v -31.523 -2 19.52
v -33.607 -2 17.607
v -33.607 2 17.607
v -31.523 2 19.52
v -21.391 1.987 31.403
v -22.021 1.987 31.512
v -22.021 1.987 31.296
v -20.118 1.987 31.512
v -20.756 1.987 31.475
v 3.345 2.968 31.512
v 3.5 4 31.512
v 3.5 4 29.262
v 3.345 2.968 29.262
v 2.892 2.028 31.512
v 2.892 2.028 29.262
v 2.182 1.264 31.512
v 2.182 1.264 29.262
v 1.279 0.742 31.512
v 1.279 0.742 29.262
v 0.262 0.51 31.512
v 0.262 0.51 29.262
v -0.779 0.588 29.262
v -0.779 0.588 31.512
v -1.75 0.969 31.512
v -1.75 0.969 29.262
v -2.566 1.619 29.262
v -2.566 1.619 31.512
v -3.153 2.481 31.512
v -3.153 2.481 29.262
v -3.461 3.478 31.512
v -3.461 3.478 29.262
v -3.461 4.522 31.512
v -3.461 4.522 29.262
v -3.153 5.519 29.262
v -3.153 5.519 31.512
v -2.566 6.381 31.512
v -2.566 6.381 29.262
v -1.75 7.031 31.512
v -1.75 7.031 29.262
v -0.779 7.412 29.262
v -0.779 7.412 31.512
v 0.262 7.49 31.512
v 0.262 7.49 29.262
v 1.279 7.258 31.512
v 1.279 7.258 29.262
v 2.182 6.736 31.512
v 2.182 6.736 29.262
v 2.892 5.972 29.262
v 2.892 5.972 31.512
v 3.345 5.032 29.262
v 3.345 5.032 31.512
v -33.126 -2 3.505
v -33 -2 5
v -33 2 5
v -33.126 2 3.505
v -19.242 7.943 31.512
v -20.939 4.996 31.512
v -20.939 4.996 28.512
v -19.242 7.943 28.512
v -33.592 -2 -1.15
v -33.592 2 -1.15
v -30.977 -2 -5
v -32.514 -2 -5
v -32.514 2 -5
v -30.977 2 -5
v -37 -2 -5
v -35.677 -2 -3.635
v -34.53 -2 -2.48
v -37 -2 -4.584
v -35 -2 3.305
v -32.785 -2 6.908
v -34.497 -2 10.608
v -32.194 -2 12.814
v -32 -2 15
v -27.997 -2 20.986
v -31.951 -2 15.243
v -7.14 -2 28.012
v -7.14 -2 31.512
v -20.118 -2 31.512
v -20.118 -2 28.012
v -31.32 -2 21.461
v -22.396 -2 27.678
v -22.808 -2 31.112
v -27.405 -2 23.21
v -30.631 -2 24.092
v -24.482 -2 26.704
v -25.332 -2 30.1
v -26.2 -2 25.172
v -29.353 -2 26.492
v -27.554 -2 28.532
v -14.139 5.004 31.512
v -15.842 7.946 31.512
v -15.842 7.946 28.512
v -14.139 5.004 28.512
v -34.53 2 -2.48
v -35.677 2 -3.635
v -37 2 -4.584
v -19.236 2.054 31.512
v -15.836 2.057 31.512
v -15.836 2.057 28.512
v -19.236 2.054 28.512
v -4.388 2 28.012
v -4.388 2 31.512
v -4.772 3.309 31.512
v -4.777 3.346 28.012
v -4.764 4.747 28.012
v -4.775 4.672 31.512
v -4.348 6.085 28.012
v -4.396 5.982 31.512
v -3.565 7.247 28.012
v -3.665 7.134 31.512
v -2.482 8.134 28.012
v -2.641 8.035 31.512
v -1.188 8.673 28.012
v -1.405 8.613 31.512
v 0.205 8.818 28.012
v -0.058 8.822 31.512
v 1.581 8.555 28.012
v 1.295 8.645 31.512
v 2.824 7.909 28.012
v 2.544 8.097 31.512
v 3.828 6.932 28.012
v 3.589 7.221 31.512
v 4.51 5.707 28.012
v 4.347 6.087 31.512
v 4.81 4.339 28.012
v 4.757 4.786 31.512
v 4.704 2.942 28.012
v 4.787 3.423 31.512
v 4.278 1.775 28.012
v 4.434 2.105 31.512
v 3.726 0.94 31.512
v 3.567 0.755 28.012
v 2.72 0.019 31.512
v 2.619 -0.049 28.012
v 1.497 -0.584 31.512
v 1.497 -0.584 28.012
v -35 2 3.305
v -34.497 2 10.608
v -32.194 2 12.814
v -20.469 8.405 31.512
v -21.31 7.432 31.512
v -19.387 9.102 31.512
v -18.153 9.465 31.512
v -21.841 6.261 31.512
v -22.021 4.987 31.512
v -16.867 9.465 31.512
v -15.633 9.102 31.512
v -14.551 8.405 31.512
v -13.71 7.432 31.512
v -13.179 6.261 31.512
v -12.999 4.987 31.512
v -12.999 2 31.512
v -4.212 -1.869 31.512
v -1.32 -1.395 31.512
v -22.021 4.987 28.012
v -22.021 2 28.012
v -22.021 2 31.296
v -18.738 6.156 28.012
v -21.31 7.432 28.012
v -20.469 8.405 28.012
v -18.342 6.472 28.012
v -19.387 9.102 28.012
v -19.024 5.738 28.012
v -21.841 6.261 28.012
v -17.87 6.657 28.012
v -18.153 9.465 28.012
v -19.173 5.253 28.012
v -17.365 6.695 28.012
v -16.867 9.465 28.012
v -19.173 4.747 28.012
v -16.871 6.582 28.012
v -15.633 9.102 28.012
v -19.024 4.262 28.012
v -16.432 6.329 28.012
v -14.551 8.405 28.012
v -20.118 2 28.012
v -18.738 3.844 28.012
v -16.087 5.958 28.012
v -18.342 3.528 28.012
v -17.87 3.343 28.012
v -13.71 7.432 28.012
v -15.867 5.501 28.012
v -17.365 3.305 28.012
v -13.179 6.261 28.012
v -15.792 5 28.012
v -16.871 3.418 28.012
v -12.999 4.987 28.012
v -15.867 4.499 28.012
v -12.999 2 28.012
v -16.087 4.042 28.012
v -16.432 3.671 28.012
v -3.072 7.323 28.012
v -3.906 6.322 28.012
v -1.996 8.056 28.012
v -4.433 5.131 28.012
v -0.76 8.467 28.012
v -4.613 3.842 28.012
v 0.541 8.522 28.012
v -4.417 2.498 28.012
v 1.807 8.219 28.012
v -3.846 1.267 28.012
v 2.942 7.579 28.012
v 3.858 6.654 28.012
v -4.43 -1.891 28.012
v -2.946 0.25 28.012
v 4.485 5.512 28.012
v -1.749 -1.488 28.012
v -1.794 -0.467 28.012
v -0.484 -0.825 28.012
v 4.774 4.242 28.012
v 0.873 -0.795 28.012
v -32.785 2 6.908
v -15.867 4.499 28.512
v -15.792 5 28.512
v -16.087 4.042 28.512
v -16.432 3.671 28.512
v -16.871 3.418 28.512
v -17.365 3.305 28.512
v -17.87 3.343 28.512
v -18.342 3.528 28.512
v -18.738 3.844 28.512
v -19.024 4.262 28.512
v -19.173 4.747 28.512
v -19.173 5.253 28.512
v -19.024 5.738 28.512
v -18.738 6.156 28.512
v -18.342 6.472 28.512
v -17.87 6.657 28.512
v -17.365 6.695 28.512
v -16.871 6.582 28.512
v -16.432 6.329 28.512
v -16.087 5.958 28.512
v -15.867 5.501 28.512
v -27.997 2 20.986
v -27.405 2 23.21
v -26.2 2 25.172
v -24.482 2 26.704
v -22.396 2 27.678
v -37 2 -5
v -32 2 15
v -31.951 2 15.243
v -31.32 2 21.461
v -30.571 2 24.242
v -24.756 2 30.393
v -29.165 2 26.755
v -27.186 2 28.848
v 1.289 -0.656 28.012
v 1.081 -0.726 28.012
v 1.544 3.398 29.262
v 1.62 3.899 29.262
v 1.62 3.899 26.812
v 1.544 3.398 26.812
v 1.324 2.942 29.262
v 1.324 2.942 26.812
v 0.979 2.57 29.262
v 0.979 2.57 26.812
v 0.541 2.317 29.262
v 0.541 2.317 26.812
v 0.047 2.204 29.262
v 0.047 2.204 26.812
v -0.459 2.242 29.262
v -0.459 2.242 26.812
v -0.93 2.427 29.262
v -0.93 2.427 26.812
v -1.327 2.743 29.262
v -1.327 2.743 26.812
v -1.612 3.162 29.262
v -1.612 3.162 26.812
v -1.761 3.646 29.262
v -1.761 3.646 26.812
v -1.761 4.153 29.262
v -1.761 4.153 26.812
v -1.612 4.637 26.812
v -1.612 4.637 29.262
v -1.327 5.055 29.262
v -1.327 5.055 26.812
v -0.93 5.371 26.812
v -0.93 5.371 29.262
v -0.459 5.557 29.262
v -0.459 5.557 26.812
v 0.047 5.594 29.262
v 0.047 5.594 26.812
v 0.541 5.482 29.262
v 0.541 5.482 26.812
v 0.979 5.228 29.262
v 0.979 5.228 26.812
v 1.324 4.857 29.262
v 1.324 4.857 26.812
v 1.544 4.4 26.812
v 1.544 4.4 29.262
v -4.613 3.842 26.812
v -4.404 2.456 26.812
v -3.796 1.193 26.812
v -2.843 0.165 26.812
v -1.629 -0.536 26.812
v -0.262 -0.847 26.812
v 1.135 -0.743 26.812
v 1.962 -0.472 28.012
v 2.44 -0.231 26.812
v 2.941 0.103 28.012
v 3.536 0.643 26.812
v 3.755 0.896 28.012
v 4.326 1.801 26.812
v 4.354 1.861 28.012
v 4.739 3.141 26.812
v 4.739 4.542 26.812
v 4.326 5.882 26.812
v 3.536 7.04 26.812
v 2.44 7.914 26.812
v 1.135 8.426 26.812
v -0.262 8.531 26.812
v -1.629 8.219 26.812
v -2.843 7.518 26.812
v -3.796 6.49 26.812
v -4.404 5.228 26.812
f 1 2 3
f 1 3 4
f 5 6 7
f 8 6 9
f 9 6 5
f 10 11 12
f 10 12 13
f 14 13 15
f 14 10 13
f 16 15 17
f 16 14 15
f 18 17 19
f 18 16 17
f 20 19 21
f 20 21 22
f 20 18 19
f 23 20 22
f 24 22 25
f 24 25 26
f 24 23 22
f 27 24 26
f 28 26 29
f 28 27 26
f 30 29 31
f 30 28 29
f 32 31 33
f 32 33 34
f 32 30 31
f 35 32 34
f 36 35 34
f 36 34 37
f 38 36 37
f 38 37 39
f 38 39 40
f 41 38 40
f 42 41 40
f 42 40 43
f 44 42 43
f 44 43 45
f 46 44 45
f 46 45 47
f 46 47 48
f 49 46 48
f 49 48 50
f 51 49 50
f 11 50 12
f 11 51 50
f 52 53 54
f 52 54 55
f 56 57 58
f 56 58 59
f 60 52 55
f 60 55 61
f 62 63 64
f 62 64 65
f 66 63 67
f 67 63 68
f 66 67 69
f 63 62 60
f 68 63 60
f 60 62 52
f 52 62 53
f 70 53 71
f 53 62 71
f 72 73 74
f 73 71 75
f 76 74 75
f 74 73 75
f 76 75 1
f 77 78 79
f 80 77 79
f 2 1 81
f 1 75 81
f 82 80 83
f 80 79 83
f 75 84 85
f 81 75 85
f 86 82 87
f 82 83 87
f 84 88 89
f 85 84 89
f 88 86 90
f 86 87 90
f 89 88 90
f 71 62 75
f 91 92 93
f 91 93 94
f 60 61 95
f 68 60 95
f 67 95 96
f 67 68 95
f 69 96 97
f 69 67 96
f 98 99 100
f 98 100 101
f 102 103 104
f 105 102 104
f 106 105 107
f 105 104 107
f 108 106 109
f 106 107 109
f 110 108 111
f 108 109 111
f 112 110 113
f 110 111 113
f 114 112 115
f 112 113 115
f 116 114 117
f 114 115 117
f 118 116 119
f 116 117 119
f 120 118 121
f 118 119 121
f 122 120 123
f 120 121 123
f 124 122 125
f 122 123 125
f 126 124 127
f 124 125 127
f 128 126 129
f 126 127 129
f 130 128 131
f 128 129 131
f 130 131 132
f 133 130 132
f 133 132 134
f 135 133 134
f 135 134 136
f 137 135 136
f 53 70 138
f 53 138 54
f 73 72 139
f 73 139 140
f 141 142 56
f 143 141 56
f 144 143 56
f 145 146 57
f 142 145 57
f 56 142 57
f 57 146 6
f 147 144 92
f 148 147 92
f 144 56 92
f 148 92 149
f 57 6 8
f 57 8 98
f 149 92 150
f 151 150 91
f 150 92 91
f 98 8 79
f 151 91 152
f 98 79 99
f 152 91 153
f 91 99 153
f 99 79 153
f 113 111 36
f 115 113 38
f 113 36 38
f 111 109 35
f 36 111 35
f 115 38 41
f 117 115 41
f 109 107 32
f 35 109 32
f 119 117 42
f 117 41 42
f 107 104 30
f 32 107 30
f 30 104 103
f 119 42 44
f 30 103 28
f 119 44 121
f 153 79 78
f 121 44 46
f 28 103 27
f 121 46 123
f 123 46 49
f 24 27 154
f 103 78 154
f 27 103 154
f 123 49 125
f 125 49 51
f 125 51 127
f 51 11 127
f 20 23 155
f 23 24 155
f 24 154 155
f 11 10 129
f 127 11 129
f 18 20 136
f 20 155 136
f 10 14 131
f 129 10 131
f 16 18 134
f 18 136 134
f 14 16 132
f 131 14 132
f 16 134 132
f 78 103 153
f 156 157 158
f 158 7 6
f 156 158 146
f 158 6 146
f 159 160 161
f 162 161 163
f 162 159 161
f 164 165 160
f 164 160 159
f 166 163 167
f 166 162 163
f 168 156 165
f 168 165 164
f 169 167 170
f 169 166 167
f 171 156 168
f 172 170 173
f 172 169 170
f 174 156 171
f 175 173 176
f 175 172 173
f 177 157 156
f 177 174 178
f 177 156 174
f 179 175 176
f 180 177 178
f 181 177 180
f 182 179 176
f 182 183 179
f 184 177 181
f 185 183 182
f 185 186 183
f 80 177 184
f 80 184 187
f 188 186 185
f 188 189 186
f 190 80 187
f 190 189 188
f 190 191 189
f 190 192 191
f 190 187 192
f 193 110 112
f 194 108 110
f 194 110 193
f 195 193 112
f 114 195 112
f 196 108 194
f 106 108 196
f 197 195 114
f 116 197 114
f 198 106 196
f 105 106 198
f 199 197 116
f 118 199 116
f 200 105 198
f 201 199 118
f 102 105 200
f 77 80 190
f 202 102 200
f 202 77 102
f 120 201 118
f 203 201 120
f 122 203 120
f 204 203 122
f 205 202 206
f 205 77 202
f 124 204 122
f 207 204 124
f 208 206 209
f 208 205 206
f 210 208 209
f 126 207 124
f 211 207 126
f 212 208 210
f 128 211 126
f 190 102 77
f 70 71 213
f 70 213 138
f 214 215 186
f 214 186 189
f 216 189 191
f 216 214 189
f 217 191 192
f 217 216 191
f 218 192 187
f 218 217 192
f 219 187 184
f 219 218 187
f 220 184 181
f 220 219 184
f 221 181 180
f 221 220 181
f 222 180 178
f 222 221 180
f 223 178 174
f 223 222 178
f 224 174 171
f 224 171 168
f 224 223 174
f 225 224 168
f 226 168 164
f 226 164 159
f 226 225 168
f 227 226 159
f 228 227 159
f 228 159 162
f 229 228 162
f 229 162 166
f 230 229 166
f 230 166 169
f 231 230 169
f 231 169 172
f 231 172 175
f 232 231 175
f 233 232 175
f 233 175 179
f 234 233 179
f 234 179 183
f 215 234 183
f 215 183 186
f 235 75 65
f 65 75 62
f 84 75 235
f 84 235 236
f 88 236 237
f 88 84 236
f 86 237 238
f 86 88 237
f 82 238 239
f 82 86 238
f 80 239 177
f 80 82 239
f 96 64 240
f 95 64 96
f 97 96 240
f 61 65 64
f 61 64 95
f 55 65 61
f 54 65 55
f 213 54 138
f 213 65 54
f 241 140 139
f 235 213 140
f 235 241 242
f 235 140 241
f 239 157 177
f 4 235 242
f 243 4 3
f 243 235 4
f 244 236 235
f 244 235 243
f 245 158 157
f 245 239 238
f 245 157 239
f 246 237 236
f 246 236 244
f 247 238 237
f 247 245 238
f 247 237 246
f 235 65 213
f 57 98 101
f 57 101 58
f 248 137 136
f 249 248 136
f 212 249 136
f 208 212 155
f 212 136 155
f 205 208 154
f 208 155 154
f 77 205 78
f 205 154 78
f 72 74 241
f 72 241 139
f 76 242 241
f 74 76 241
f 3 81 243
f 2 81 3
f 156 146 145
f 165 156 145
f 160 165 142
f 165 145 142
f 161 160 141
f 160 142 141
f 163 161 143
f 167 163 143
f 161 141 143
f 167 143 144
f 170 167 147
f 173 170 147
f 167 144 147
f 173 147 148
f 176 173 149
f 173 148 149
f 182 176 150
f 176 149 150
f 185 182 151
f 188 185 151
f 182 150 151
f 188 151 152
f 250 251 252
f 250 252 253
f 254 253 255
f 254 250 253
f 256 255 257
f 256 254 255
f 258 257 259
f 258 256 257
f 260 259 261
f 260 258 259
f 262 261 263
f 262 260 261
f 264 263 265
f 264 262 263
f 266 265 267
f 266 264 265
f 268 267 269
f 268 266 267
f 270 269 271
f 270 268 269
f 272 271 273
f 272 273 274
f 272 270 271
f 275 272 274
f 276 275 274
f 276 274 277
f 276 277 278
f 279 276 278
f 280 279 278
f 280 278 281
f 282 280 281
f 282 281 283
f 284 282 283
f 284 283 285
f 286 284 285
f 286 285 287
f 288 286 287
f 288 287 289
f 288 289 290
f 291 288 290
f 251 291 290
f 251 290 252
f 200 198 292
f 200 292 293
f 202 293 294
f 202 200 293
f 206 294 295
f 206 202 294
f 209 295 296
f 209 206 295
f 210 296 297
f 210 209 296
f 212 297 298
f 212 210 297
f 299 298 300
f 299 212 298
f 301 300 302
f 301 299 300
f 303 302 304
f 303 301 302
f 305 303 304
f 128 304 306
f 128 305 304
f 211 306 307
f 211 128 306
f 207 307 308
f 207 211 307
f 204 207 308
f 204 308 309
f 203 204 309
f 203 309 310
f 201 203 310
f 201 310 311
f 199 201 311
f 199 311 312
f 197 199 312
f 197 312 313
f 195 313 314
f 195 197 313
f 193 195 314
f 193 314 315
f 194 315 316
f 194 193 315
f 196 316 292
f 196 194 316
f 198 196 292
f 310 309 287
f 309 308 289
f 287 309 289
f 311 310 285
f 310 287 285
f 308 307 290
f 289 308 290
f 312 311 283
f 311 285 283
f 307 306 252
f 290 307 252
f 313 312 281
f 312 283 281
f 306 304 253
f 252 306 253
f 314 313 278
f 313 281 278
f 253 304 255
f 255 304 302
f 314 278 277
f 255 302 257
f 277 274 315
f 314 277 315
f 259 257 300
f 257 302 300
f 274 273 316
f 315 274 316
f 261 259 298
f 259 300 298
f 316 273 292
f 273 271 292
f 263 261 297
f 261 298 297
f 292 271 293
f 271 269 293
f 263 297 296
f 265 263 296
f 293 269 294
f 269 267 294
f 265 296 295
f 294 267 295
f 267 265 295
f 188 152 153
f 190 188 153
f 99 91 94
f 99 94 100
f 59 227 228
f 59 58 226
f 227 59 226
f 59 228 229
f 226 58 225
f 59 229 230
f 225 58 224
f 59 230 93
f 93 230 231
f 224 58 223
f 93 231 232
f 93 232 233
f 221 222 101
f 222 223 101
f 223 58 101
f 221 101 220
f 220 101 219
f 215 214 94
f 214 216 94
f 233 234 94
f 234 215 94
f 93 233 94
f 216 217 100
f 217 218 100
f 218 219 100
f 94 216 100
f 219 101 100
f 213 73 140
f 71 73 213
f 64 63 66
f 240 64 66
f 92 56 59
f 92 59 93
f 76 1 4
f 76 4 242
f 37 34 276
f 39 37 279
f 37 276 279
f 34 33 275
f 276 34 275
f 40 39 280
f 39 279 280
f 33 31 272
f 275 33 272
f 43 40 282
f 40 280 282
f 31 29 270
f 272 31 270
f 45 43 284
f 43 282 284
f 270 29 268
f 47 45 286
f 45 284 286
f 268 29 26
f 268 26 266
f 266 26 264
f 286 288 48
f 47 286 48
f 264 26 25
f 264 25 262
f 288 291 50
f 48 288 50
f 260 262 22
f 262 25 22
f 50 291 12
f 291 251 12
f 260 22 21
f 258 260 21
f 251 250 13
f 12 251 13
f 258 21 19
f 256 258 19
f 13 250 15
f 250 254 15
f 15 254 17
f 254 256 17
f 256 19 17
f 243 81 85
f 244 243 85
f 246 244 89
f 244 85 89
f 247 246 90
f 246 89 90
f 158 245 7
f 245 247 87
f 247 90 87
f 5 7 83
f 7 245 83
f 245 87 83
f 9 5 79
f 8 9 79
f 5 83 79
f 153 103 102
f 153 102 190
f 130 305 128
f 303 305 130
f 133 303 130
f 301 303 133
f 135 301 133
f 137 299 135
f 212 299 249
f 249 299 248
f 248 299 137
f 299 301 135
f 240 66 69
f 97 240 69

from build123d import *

# Parameters (mm, degrees)
PAD063_DEPTH       = 2
PAD064_DEPTH       = 3.5
SKETCH106_R        = 3.5
POCKET003047_DEPTH = 2.25
SKETCH107_R        = 4.702209
PAD065_DEPTH       = 1.2
SKETCH108_R        = 1.7
POCKET003048_DEPTH = 5
PAD066_DEPTH       = 3.5
SKETCH110_R        = 1.7
POCKET003049_DEPTH = 5
POCKET003050_DEPTH = 3
PAD068_DEPTH       = 4


with BuildPart() as v4_non_servo_sg92_leg:
    # Sketch104 → Pad063 (new body, symmetric)
    with BuildSketch(Plane.XZ):
        with BuildLine():
            Line((7.19326, 28.01235), (20.118014, 28.01235))
            ThreePointArc((27.996703, 20.985646), (25.396468, 26.000474), (20.118014, 28.01235))
            Line((27.996703, 20.985646), (30.977077, -4.999855))
            Line((33.977077, -4.999855), (30.977077, -4.999855))
            Line((31.375084, 21.001564), (33.977077, -4.999855))
            ThreePointArc((31.375084, 21.001564), (27.724482, 28.375326), (20.118014, 31.51235))
            Line((7.19326, 31.51235), (20.118014, 31.51235))
            Line((7.19326, 28.01235), (7.19326, 31.51235))
        make_face()
    extrude(amount=PAD063_DEPTH, both=True)

    # Sketch105 → Pad064 (new body)
    with BuildSketch(Plane(origin=(0, 0, 31.51235), x_dir=(-1, 0, 0), z_dir=(0, 0, 1))):
        with BuildLine():
            Line((-18, 2), (-18, -2))
            Line((-18, -2), (-4.3876, -2))
            ThreePointArc((-4.3876, -2), (1.938593, -8.415251), (1.496731, 0.583689))
            ThreePointArc((1.496731, 0.583689), (-2.758605, 1.674941), (-7.139591, 2))
            Line((-18, 2), (-7.139591, 2))
        make_face()
    extrude(amount=-PAD064_DEPTH)

    # Sketch106 → Pocket003047 (cut)
    with BuildSketch(Plane(origin=(0, 0, 31.51235), x_dir=(-1, 0, 0), z_dir=(0, 0, 1))):
        with Locations((0, -4)):
            Circle(SKETCH106_R)
    extrude(amount=-POCKET003047_DEPTH, mode=Mode.SUBTRACT)

    # Sketch107 → Pad065 (new body)
    with BuildSketch(Plane(origin=(0, 0, 28.01235), x_dir=(1, 0, 0), z_dir=(0, 0, -1))):
        with Locations((-0.089106, -3.841625)):
            Circle(SKETCH107_R)
    extrude(amount=PAD065_DEPTH)

    # Sketch108 → Pocket003048 (cut)
    with BuildSketch(Plane(origin=(0, 0, 29.26235), x_dir=(-1, 0, 0), z_dir=(0, 0, 1))):
        with Locations((-0.080471, -3.899184)):
            Circle(SKETCH108_R)
    extrude(amount=-POCKET003048_DEPTH, mode=Mode.SUBTRACT)

    # Sketch109 → Pad066 (new body)
    with BuildSketch(Plane(origin=(0, 0, 31.51235), x_dir=(-1, 0, 0), z_dir=(0, 0, 1))):
        with BuildLine():
            Line((-22.021201, -1.987049), (-22.021201, -4.986919))
            ThreePointArc((-22.021201, -4.986919), (-17.510002, -9.511218), (-12.998803, -4.986919))
            Line((-12.998803, -4.986919), (-12.998803, -1.987049))
            Line((-22.021201, -1.987049), (-12.998803, -1.987049))
        make_face()
    extrude(amount=-PAD066_DEPTH)

    # Sketch110 → Pocket003049 (cut)
    with BuildSketch(Plane(origin=(0, 0, 31.51235), x_dir=(-1, 0, 0), z_dir=(0, 0, 1))):
        with Locations((-17.491917, -5)):
            Circle(SKETCH110_R)
    extrude(amount=-POCKET003049_DEPTH, mode=Mode.SUBTRACT)

    # Sketch111 → Pocket003050 (cut)
    with BuildSketch(Plane(origin=(0, 0, 31.51235), x_dir=(-1, 0, 0), z_dir=(0, 0, 1))):
        Polygon((-14.138998, -5.003928), (-15.835596, -2.057479), (-19.235593, -2.053552), (-20.938994, -4.996072), (-19.242396, -7.942521), (-15.842399, -7.946448), align=None)
    extrude(amount=-POCKET003050_DEPTH, mode=Mode.SUBTRACT)

    # Sketch112 → Pad068 (new body)
    with BuildSketch(Plane.XZ.offset(2)):
        with BuildLine():
            Line((27, 28.536497), (32.513573, -5))
            Line((32.513573, -5), (37.000002, -5))
            Line((37.000002, -5), (37.000002, -4.583553))
            ThreePointArc((33.505627, -1), (35.019116, -3.019659), (37.000002, -4.583553))
            Line((33, 5), (33.505627, -1))
            Line((35, 3.304739), (33, 5))
            Line((32.728943, 7), (35, 3.304739))
            Line((32, 13), (32.728943, 7))
            Line((34.496559, 10.608005), (32, 13))
            Line((32, 15), (34.496559, 10.608005))
            Line((31, 20), (32, 15))
            Line((33.606815, 17.606869), (31, 20))
            Line((31, 22), (33.606815, 17.606869))
            Line((27, 28.536497), (31, 22))
        make_face()
    extrude(amount=-PAD068_DEPTH)


with BuildPart() as part_mirroring012:
    # Part__Mirroring012: instance of V4_non_servo_SG92_leg
    add(v4_non_servo_sg92_leg.part.mirror(Plane(origin=(0, 0, 0), x_dir=(0, -1, 0), z_dir=(1, 0, 0))))


solid = part_mirroring012.part
